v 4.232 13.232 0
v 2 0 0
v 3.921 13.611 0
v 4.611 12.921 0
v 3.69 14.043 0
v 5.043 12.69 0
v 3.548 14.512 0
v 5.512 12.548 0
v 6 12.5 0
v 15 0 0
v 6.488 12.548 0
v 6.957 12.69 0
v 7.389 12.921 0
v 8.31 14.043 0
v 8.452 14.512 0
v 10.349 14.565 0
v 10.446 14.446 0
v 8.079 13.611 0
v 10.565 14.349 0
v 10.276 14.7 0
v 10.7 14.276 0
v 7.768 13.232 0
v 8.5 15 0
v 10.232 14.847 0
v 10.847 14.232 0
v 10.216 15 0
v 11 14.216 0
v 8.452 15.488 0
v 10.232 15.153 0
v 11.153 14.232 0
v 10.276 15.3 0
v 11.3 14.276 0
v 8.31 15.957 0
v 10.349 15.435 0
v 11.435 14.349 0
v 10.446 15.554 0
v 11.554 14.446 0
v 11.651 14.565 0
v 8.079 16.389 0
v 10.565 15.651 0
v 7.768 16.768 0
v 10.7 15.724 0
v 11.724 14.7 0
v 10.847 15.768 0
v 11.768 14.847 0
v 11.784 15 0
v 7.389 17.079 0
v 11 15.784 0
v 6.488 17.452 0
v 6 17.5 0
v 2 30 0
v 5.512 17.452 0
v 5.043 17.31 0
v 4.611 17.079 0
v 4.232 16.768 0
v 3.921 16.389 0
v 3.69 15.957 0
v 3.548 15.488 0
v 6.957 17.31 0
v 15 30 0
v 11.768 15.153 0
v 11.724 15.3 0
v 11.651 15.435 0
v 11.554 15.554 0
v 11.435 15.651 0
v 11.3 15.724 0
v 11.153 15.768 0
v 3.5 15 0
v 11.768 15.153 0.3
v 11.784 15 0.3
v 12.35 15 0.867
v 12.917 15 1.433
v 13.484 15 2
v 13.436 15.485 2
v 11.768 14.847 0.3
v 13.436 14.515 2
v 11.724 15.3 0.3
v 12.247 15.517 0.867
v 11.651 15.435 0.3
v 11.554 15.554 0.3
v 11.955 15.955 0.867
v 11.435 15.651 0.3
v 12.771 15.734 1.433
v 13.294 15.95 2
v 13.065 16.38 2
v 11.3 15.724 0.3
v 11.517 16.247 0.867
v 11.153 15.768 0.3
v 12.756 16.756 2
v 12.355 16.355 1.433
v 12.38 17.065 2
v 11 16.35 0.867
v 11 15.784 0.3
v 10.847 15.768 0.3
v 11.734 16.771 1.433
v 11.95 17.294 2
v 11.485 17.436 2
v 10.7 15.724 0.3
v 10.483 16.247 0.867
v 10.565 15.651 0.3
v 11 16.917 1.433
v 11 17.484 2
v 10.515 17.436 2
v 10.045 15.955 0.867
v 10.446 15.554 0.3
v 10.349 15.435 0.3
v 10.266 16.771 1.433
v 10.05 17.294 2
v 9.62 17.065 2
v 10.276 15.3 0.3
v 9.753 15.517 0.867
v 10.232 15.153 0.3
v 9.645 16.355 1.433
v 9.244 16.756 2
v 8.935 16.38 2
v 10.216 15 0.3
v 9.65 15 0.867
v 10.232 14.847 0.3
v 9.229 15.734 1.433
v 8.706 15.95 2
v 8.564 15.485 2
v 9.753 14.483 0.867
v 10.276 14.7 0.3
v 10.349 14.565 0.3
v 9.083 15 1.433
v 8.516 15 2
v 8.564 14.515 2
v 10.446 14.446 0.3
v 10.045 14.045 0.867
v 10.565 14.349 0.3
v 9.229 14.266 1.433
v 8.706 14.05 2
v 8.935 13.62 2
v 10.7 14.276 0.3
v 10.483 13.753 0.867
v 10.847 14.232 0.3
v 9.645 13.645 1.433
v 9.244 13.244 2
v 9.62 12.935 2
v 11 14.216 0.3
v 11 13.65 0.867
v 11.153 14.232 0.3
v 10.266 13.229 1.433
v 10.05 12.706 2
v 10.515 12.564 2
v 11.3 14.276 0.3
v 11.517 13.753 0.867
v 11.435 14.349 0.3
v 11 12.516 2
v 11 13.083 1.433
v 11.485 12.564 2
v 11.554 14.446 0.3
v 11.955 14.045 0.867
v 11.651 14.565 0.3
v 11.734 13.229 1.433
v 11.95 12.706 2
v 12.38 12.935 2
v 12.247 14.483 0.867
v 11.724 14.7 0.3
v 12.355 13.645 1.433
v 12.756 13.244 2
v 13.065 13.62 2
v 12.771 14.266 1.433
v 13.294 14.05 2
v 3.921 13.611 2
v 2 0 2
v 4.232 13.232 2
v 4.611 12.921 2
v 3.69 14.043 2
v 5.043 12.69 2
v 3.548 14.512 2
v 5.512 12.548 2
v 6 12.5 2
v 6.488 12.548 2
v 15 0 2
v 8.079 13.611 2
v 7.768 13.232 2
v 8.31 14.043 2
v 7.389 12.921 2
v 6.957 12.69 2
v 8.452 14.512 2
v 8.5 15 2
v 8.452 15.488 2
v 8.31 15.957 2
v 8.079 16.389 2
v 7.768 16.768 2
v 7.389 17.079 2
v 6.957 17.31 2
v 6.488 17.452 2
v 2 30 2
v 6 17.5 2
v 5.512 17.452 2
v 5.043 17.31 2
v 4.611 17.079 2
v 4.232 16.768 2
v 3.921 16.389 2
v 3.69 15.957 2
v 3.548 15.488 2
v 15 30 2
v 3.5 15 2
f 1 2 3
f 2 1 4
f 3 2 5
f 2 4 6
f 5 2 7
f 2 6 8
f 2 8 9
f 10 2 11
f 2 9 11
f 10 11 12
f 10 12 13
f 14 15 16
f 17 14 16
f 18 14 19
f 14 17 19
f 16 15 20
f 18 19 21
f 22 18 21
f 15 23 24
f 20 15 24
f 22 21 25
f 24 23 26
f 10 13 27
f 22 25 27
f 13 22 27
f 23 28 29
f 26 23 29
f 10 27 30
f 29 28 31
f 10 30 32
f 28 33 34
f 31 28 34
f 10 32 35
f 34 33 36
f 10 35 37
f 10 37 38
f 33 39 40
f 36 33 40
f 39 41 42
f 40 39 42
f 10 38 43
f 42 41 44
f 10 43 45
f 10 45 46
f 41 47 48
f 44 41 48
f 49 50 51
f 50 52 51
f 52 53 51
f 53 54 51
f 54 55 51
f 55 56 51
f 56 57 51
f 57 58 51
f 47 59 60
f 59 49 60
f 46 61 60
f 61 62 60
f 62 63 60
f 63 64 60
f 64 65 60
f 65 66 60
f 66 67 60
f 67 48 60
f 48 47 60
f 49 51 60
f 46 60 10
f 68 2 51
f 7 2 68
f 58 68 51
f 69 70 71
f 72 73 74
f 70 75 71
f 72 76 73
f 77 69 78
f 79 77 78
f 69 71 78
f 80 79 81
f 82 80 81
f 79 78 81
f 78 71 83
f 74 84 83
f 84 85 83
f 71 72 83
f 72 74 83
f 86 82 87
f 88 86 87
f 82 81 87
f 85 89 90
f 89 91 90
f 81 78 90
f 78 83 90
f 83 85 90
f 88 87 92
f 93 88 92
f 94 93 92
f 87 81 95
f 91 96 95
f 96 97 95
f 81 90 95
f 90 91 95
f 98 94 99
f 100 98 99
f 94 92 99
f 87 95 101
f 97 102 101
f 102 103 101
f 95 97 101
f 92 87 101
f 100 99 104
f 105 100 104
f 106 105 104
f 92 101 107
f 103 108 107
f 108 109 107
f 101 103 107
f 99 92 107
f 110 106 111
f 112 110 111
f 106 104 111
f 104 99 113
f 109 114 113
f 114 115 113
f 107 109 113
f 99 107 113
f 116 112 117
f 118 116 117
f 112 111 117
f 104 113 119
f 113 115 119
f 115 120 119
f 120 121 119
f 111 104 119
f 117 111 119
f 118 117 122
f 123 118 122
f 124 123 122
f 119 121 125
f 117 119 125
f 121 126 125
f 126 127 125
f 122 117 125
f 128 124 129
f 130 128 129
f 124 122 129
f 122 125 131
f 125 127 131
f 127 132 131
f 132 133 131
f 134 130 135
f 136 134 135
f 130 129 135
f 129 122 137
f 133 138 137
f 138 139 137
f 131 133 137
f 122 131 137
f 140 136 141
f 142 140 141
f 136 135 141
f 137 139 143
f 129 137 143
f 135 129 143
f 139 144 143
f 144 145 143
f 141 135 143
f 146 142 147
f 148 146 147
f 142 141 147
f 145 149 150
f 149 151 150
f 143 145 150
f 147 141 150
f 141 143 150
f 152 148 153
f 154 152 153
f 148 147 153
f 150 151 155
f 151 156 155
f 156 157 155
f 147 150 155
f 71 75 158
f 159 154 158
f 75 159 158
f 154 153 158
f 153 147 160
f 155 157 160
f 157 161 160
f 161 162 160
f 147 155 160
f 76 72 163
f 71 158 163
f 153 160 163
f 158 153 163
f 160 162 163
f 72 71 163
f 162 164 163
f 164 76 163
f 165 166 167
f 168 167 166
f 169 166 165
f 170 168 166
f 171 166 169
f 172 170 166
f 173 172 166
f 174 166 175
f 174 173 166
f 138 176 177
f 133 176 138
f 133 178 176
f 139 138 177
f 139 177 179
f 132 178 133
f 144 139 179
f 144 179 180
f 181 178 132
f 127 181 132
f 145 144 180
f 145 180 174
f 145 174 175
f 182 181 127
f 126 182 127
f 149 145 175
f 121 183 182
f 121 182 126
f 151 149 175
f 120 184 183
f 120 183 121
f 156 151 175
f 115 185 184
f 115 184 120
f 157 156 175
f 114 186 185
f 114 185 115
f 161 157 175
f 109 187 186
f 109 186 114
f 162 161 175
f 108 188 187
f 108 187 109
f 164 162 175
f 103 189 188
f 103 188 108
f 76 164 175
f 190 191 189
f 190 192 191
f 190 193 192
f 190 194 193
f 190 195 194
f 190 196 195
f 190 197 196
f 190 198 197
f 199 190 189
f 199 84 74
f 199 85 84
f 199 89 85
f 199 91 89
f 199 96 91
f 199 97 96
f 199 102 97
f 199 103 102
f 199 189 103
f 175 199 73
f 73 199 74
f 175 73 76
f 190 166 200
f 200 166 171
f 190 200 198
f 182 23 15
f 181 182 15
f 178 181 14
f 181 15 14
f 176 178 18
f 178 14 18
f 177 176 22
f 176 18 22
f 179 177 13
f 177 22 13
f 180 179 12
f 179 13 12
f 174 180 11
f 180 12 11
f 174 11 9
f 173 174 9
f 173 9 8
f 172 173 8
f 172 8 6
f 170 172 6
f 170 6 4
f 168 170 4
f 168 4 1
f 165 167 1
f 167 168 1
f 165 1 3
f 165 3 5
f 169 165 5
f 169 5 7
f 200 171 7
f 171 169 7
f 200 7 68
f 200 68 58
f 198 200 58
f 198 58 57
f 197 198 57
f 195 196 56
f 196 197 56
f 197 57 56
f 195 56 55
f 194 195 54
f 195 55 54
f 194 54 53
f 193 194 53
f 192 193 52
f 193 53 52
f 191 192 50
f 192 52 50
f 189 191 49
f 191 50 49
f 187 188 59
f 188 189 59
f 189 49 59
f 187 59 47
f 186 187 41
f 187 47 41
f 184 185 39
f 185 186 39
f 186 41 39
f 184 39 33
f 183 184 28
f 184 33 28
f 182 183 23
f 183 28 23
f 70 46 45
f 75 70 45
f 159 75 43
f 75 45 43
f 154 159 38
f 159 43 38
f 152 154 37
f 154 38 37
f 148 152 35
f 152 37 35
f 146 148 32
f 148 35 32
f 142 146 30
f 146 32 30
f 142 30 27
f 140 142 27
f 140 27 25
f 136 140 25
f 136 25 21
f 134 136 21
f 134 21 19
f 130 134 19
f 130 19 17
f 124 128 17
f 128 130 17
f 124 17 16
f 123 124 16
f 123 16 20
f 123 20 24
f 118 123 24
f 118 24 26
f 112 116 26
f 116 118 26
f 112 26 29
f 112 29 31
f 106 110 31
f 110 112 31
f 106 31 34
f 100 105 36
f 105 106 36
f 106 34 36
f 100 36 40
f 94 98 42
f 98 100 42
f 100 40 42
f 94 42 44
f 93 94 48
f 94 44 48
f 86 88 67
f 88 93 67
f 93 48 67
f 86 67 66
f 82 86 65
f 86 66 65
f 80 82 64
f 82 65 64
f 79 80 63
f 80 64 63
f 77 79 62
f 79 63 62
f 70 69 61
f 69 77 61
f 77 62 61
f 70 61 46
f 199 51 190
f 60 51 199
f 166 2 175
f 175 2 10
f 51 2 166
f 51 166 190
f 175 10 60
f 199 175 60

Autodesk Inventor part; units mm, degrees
ref_plane "YZ Plane" through (0, 0, 0) normal (1, 0, 0) x (0, 1, 0)
ref_plane "XZ Plane" through (0, 0, 0) normal (0, 1, 0) x (-1, 0, 0)
ref_plane "XY Plane" through (0, 0, 0) normal (0, 0, 1) x (1, 0, 0)
sketch "Skizze1" plane through (0, 0, 0) normal (0, 0, 1) x (1, 0, 0)
  circle A0 centre (6, 15) radius 2.5 projected
  circle A1 centre (11, 15) radius 0.7835 projected
  line L0 (0, 0) -> (15, 0) projected
  line L1 (15, 0) -> (15, 30) projected
  line L2 (0, 30) -> (15, 30) projected
  line L3 (0, 0) -> (0, 30) projected
  line L4 (2, 0) -> (2, 30) projected
extrude "Extrusion1" add sketch "Skizze1" along normal blind 2 contours L4 L2 L1 L0
chamfer "Fasen1" distance 1.7 angle 45 1 edges at (10.2165, 15, 2)
properties part number "LagerHO" material "Polyethylen, hohe Dichte, Gleitfläche"
